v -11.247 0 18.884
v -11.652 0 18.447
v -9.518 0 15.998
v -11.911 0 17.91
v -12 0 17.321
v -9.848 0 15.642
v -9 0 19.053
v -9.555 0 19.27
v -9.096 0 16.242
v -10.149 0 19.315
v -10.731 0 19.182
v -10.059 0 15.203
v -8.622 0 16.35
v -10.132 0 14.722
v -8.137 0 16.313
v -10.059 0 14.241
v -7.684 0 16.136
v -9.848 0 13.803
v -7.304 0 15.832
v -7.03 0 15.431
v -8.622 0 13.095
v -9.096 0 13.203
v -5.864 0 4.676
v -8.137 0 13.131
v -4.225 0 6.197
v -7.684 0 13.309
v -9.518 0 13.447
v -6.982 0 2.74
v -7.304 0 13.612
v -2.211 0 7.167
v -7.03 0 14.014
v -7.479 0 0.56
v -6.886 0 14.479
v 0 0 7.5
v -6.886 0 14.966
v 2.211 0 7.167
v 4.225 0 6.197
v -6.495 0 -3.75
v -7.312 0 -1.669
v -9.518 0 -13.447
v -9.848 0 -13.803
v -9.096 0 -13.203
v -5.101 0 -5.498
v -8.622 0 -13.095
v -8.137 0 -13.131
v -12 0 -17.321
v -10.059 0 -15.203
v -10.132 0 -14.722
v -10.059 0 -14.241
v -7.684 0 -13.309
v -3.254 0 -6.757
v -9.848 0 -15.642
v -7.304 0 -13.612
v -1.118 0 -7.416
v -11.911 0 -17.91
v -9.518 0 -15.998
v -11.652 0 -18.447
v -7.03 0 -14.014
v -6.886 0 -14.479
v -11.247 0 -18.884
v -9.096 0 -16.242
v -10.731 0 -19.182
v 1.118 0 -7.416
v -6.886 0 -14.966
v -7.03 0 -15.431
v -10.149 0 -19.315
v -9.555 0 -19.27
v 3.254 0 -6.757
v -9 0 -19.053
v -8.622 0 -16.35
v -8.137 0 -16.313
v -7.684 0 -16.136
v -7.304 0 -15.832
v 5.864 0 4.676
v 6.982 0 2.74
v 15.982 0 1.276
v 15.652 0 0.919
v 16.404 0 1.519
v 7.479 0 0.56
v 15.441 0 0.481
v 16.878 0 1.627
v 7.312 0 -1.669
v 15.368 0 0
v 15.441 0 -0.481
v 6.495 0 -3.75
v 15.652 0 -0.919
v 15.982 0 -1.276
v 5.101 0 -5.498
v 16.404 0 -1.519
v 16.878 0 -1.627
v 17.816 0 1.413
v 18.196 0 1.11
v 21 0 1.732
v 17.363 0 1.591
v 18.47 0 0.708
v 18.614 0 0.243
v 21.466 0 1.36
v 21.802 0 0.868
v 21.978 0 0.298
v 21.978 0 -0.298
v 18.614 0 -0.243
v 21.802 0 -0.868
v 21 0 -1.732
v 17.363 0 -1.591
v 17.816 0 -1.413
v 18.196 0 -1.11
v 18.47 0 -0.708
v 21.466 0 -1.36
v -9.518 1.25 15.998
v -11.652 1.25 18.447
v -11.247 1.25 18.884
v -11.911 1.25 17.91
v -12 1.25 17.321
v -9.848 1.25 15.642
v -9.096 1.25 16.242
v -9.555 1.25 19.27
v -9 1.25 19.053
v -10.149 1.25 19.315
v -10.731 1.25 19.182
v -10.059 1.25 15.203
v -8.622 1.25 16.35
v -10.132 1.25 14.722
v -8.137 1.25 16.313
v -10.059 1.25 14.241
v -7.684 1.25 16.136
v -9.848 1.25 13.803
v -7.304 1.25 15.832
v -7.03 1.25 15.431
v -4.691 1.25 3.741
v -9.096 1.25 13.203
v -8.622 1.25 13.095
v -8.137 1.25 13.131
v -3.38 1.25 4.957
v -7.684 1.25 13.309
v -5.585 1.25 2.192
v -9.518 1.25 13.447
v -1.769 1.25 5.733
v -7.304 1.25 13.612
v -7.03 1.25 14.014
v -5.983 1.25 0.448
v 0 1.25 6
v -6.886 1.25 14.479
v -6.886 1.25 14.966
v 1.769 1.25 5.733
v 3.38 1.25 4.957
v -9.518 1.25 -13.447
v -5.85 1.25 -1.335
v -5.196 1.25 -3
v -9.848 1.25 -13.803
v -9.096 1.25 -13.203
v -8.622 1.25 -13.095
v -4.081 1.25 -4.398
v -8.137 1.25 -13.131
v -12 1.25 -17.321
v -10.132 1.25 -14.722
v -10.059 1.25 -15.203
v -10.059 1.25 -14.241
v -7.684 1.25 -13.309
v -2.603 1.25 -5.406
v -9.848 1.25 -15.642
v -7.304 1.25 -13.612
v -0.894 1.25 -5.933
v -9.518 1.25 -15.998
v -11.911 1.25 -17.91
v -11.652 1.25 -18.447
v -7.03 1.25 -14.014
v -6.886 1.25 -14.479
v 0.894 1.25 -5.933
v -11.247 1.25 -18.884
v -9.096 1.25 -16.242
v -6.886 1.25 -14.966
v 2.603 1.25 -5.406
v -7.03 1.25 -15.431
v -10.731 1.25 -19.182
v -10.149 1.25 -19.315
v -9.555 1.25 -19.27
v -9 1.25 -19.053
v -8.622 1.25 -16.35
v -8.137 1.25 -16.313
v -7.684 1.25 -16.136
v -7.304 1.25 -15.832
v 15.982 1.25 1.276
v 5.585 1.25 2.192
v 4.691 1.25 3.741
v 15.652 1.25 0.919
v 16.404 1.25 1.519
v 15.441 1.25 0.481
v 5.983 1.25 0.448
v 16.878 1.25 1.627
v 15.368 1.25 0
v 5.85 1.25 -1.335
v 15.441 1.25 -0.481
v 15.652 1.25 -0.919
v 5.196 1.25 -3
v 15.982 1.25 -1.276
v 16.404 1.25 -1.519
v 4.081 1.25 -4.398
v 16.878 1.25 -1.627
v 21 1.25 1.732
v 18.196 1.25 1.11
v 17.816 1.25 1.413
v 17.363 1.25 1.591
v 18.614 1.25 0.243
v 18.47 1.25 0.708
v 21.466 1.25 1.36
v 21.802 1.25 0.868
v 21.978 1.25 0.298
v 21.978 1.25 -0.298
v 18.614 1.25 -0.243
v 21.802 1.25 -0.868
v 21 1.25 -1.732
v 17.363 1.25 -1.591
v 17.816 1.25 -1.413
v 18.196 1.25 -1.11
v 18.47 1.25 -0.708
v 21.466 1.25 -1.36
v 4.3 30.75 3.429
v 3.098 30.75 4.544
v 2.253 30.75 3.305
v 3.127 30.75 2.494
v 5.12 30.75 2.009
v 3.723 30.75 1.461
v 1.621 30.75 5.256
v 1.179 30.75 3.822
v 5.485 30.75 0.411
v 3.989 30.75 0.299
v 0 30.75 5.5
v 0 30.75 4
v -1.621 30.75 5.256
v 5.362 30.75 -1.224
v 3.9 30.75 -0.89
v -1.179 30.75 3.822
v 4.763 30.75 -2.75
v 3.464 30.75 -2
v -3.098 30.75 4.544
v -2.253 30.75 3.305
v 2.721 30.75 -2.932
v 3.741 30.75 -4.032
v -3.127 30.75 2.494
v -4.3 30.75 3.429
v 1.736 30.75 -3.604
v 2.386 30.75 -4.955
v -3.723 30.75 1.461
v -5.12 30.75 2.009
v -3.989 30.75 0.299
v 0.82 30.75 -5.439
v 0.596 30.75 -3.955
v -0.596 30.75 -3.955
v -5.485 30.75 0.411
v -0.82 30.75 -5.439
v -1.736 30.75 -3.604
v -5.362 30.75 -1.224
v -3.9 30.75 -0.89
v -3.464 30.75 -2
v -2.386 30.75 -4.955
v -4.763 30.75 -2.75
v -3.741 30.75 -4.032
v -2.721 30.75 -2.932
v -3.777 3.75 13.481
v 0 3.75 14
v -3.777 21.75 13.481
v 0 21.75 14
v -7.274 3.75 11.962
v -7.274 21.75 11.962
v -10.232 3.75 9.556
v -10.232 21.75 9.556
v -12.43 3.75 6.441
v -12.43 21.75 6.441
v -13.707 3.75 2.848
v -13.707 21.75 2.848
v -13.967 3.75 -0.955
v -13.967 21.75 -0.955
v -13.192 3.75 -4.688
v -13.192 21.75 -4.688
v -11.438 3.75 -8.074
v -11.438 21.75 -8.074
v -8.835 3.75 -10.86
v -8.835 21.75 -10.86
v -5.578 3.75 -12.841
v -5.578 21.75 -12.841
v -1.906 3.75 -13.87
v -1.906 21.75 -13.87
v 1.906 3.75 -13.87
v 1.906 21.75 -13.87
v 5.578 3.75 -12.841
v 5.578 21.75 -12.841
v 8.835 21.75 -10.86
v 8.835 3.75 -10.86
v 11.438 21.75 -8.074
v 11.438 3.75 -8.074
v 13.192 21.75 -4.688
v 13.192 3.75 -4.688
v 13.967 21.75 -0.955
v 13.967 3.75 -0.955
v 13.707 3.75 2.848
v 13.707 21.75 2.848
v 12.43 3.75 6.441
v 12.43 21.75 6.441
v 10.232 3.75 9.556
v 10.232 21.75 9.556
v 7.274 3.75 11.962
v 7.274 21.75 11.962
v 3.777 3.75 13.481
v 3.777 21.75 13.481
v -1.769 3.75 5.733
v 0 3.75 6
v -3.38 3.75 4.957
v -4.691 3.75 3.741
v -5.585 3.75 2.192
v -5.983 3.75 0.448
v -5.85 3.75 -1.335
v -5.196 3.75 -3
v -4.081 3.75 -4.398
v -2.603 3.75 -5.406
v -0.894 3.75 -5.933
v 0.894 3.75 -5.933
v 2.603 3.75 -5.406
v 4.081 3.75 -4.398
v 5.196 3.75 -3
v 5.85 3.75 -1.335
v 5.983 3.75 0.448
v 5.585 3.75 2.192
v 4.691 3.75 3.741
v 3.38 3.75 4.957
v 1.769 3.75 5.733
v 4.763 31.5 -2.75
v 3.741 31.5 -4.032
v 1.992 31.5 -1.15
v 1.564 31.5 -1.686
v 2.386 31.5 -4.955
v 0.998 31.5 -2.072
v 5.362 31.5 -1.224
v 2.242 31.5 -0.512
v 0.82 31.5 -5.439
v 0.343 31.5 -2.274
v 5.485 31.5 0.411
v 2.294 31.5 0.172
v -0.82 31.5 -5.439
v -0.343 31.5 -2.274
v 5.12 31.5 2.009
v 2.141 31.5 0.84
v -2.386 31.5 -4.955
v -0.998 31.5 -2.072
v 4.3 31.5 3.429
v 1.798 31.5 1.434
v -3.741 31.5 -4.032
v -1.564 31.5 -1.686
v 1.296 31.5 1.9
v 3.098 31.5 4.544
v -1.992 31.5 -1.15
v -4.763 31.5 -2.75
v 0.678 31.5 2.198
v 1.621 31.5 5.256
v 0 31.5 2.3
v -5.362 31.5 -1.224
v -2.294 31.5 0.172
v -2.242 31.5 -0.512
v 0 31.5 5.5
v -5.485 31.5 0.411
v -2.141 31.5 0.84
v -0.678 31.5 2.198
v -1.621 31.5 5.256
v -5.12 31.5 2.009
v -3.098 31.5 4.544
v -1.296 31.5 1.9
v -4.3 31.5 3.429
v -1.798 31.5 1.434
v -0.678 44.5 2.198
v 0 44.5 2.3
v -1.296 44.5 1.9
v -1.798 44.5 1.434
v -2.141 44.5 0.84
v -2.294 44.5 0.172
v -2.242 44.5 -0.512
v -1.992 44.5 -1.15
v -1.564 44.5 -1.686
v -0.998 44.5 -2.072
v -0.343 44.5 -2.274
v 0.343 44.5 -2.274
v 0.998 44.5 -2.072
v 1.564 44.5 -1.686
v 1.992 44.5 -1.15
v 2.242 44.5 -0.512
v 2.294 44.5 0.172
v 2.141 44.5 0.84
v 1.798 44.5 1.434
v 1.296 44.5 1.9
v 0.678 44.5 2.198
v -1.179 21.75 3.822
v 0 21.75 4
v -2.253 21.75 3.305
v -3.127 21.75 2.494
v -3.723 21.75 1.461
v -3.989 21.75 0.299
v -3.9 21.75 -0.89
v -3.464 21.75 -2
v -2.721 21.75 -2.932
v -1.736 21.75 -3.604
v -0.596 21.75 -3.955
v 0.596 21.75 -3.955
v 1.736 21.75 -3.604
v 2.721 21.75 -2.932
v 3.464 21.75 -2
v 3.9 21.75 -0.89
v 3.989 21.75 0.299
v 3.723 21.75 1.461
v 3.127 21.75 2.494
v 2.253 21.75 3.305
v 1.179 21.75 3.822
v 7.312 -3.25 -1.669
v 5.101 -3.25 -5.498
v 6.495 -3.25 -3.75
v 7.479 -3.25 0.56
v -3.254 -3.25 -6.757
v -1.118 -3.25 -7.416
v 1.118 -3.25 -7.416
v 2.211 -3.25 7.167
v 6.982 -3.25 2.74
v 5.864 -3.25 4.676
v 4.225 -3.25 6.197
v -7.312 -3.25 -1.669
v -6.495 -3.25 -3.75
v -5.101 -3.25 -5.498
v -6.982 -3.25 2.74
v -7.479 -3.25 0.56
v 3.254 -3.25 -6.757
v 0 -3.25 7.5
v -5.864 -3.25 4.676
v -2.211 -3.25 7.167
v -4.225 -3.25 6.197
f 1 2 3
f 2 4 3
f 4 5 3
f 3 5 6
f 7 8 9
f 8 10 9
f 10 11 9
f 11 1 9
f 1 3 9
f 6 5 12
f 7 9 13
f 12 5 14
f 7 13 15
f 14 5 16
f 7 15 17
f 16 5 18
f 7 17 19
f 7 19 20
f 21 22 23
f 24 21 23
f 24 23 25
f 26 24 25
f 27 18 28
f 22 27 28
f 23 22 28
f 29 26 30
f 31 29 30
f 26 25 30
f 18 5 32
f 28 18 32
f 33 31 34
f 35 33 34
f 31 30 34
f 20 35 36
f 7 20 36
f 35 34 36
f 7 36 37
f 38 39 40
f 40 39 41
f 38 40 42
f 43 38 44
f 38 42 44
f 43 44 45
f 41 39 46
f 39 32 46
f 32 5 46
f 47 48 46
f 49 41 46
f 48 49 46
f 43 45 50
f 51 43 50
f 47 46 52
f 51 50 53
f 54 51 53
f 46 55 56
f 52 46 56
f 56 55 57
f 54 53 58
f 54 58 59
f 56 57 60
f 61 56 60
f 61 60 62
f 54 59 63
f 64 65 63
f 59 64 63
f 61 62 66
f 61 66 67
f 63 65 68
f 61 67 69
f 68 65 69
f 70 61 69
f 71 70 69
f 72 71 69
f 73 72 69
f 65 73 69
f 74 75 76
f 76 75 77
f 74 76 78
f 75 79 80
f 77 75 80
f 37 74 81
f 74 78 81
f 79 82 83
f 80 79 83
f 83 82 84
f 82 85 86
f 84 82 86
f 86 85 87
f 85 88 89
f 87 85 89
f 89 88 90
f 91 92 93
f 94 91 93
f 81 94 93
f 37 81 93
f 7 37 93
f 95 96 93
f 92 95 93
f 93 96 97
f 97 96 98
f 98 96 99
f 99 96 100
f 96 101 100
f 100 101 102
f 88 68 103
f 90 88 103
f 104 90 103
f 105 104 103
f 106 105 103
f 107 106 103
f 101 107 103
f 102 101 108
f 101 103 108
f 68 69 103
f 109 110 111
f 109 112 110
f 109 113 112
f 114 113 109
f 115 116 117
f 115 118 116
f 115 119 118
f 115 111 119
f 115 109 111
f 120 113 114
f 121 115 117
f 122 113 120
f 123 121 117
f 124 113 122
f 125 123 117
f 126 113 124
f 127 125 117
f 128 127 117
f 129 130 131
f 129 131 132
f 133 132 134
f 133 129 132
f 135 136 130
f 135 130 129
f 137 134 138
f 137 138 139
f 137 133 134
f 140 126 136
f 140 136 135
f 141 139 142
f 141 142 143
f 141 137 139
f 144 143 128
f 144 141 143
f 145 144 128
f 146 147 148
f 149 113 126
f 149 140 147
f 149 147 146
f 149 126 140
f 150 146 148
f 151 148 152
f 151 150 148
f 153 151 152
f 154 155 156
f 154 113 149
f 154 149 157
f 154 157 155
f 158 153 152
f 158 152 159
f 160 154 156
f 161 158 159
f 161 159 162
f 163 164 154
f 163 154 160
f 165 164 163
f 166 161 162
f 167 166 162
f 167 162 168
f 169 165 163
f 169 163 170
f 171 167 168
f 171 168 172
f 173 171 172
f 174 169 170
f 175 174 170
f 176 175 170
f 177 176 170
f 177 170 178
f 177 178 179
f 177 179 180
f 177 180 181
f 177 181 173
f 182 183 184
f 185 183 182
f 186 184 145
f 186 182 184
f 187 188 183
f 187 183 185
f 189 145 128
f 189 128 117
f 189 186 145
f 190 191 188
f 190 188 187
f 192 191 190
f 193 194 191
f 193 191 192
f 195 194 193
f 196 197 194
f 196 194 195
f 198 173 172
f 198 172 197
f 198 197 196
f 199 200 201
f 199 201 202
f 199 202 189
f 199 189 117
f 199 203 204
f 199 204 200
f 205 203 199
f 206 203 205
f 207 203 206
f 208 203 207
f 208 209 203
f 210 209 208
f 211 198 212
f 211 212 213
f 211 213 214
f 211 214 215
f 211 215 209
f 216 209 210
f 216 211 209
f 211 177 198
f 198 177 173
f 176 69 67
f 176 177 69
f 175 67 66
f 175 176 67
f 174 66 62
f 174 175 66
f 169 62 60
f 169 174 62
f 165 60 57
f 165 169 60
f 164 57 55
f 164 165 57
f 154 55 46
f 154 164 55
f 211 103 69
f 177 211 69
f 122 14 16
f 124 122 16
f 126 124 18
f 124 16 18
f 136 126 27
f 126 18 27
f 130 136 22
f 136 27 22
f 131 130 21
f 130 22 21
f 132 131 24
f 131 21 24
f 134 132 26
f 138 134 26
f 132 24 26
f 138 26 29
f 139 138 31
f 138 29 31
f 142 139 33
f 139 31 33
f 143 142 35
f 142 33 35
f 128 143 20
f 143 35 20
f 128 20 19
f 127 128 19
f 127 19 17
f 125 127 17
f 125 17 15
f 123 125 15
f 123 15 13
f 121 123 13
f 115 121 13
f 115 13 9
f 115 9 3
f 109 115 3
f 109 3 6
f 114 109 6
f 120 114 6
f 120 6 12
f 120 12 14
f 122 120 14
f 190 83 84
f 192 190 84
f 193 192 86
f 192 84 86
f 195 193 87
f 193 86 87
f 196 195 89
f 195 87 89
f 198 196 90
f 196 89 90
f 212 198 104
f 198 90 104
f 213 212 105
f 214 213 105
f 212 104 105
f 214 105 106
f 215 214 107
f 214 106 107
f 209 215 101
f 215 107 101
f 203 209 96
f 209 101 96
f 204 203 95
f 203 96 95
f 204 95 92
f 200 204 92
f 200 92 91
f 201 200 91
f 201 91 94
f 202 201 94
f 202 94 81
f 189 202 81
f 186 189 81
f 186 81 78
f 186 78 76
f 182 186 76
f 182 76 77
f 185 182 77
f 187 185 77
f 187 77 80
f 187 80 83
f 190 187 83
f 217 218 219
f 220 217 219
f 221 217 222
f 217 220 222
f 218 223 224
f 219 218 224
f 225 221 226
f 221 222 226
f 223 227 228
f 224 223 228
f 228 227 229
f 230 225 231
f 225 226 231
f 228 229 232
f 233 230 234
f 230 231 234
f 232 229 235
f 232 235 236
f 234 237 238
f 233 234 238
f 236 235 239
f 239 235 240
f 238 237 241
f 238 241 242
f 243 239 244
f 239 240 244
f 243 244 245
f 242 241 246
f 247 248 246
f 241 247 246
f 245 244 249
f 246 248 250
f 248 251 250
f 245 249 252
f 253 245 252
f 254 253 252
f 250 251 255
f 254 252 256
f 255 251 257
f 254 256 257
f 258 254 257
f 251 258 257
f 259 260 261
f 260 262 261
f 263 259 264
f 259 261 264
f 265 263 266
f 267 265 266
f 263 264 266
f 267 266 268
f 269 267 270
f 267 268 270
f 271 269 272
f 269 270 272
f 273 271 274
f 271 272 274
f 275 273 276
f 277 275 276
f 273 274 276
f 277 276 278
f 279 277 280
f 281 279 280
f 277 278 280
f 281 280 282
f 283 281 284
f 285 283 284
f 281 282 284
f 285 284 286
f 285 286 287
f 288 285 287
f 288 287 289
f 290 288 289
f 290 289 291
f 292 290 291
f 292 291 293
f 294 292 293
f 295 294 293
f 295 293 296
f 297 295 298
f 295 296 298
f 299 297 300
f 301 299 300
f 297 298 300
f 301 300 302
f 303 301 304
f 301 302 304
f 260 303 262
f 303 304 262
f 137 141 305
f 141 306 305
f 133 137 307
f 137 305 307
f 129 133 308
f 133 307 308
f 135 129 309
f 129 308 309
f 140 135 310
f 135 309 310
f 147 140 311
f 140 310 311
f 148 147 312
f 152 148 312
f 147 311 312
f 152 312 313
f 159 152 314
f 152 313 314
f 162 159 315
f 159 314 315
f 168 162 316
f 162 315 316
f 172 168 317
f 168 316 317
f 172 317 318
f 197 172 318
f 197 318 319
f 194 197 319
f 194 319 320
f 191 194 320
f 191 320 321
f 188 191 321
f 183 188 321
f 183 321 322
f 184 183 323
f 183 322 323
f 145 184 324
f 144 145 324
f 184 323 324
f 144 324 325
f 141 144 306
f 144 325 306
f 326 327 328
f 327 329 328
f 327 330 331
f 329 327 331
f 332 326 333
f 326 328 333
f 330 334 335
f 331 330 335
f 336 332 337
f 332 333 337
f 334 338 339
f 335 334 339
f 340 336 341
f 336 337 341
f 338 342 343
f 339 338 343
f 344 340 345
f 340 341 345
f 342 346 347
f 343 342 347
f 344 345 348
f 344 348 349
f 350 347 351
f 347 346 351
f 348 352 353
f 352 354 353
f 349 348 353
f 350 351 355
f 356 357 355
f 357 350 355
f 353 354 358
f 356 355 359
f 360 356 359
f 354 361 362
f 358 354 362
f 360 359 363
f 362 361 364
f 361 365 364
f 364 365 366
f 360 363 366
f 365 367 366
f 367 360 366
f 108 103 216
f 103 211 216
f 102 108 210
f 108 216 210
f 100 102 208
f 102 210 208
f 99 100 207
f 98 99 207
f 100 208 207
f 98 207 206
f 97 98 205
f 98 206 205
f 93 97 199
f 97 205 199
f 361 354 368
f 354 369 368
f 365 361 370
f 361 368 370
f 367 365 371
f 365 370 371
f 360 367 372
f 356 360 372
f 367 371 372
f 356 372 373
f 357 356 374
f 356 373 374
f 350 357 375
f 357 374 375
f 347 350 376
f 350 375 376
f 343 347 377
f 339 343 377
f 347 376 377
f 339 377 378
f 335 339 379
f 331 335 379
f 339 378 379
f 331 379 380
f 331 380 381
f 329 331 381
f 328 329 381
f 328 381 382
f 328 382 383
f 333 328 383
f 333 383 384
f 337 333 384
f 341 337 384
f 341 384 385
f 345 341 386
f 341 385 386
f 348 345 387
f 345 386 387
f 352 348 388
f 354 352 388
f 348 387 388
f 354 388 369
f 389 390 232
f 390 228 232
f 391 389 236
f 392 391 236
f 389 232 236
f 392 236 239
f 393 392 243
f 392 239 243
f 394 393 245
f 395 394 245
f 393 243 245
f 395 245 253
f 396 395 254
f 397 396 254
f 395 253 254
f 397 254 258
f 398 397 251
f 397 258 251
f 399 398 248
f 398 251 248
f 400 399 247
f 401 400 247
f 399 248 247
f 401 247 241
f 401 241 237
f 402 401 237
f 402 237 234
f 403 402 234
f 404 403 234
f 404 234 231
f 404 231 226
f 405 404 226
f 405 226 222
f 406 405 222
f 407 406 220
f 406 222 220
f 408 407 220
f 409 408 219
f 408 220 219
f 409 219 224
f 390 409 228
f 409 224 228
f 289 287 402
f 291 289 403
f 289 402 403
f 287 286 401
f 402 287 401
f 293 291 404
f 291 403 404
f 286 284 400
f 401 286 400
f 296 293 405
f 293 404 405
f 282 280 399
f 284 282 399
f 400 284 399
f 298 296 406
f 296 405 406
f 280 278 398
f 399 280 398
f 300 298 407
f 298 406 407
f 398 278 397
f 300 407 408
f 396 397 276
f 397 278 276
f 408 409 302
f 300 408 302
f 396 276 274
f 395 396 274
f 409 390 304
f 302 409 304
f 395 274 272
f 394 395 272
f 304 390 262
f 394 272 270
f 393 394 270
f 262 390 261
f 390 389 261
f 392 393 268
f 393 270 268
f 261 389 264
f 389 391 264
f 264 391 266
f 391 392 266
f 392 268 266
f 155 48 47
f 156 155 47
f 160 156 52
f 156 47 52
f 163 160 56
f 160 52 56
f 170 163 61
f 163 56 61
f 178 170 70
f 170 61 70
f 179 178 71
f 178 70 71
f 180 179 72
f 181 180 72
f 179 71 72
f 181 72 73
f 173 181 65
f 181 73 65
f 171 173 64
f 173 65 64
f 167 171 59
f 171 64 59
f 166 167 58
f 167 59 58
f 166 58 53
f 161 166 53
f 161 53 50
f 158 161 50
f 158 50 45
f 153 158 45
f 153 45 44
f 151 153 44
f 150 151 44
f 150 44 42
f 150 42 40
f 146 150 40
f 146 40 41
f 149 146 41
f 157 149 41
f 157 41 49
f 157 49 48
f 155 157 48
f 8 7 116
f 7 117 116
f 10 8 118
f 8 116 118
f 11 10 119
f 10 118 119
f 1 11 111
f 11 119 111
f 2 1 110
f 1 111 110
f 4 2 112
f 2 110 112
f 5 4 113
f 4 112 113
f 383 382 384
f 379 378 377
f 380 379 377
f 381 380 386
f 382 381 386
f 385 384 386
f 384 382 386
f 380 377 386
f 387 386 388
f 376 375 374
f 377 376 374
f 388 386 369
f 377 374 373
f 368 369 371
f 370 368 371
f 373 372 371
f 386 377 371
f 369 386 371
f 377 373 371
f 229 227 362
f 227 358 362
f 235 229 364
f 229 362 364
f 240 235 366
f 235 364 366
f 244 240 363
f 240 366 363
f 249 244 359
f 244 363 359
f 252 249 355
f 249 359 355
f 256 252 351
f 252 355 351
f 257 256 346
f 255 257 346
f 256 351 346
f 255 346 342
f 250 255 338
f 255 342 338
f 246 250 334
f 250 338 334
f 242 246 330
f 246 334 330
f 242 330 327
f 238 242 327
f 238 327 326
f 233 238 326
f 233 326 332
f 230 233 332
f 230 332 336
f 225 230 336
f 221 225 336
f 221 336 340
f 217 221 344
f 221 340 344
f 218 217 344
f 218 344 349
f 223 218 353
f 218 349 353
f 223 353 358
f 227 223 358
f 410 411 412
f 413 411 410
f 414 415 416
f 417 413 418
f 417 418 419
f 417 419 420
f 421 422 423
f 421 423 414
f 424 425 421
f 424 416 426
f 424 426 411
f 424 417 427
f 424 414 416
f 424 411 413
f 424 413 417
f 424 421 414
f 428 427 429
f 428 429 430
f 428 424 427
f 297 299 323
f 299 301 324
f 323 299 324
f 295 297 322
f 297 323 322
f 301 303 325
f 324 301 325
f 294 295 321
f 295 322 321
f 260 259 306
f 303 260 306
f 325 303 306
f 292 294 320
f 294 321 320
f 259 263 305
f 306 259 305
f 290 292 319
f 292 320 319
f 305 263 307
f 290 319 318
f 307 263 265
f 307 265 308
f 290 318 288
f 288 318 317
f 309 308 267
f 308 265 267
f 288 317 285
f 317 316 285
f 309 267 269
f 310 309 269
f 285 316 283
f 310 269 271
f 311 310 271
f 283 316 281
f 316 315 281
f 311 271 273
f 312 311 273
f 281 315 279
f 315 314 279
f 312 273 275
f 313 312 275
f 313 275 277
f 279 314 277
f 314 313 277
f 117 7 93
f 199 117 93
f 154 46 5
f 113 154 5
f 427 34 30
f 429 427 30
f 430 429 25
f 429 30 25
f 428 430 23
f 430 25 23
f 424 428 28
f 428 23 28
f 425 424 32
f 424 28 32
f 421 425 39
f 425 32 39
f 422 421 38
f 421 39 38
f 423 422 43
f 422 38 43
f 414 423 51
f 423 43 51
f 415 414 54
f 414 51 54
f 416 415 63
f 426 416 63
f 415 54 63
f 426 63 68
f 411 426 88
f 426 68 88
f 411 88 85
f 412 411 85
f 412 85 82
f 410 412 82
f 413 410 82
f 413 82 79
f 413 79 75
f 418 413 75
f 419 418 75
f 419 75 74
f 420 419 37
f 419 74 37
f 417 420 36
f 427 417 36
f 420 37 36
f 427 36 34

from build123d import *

# Parameters (mm, degrees)
BOSS_EXTRUDE1_DEPTH   = 1.25
F_4_CLEARANCE_HOLE1_D = 3.2639
SKETCH5_R             = 7.5
BOSS_EXTRUDE2_DEPTH   = 3.25
FILLET2_R             = 2


with BuildPart() as part:
    # Sketch1 → Boss-Extrude1 (new body)
    with BuildSketch(Plane(origin=(0, 0, 0), x_dir=(1, 0, 0), z_dir=(0, 1, 0))):
        Polygon((24, 0), (-12, 20.784609691), (-12, -20.784609691), align=None)
    extrude(amount=BOSS_EXTRUDE1_DEPTH)

    # #4 Clearance Hole1 (through all)
    with Locations(Plane(origin=(0, 1.25, 0), x_dir=(1, 0, 0), z_dir=(0, 1, 0))):
        with Locations((-8.5, 14.722431864), (-8.5, -14.722431864), (17, 0)):
            Hole(F_4_CLEARANCE_HOLE1_D / 2)

    # Sketch4 → Revolve1 (revolve)
    with BuildSketch(Plane(origin=(0, 0, 0), x_dir=(0, 0, -1), z_dir=(1, 0, 0)), mode=Mode.PRIVATE) as revolve1_sk:
        Polygon((0, 1.25), (6, 1.25), (6, 3.75), (14, 3.75), (14, 21.75), (4, 21.75), (4, 30.75), (5.5, 30.75), (5.5, 31.5), (2.3, 31.5), (2.3, 44.5), (0, 44.5), align=None)
    revolve(revolve1_sk.sketch.rotate(Axis((0, 44.5, 0), (0, -1, 0)), 180), axis=Axis((0, 44.5, 0), (0, -1, 0)))

    # Sketch5 → Boss-Extrude2 (add)
    with BuildSketch(Plane.XZ):
        with Locations(Location((0, 0, 0), (0, 0, 90))):
            Circle(SKETCH5_R)
    extrude(amount=BOSS_EXTRUDE2_DEPTH)

    # Fillet2
    fillet2_edges = [part.edges().sort_by_distance(p)[0] for p in [
        (-12, 0.625, 20.784609691),
        (-12, 0.625, -20.784609691),
        (24, 0.625, 0),
    ]]
    fillet(fillet2_edges, radius=FILLET2_R)


solid = part.part
